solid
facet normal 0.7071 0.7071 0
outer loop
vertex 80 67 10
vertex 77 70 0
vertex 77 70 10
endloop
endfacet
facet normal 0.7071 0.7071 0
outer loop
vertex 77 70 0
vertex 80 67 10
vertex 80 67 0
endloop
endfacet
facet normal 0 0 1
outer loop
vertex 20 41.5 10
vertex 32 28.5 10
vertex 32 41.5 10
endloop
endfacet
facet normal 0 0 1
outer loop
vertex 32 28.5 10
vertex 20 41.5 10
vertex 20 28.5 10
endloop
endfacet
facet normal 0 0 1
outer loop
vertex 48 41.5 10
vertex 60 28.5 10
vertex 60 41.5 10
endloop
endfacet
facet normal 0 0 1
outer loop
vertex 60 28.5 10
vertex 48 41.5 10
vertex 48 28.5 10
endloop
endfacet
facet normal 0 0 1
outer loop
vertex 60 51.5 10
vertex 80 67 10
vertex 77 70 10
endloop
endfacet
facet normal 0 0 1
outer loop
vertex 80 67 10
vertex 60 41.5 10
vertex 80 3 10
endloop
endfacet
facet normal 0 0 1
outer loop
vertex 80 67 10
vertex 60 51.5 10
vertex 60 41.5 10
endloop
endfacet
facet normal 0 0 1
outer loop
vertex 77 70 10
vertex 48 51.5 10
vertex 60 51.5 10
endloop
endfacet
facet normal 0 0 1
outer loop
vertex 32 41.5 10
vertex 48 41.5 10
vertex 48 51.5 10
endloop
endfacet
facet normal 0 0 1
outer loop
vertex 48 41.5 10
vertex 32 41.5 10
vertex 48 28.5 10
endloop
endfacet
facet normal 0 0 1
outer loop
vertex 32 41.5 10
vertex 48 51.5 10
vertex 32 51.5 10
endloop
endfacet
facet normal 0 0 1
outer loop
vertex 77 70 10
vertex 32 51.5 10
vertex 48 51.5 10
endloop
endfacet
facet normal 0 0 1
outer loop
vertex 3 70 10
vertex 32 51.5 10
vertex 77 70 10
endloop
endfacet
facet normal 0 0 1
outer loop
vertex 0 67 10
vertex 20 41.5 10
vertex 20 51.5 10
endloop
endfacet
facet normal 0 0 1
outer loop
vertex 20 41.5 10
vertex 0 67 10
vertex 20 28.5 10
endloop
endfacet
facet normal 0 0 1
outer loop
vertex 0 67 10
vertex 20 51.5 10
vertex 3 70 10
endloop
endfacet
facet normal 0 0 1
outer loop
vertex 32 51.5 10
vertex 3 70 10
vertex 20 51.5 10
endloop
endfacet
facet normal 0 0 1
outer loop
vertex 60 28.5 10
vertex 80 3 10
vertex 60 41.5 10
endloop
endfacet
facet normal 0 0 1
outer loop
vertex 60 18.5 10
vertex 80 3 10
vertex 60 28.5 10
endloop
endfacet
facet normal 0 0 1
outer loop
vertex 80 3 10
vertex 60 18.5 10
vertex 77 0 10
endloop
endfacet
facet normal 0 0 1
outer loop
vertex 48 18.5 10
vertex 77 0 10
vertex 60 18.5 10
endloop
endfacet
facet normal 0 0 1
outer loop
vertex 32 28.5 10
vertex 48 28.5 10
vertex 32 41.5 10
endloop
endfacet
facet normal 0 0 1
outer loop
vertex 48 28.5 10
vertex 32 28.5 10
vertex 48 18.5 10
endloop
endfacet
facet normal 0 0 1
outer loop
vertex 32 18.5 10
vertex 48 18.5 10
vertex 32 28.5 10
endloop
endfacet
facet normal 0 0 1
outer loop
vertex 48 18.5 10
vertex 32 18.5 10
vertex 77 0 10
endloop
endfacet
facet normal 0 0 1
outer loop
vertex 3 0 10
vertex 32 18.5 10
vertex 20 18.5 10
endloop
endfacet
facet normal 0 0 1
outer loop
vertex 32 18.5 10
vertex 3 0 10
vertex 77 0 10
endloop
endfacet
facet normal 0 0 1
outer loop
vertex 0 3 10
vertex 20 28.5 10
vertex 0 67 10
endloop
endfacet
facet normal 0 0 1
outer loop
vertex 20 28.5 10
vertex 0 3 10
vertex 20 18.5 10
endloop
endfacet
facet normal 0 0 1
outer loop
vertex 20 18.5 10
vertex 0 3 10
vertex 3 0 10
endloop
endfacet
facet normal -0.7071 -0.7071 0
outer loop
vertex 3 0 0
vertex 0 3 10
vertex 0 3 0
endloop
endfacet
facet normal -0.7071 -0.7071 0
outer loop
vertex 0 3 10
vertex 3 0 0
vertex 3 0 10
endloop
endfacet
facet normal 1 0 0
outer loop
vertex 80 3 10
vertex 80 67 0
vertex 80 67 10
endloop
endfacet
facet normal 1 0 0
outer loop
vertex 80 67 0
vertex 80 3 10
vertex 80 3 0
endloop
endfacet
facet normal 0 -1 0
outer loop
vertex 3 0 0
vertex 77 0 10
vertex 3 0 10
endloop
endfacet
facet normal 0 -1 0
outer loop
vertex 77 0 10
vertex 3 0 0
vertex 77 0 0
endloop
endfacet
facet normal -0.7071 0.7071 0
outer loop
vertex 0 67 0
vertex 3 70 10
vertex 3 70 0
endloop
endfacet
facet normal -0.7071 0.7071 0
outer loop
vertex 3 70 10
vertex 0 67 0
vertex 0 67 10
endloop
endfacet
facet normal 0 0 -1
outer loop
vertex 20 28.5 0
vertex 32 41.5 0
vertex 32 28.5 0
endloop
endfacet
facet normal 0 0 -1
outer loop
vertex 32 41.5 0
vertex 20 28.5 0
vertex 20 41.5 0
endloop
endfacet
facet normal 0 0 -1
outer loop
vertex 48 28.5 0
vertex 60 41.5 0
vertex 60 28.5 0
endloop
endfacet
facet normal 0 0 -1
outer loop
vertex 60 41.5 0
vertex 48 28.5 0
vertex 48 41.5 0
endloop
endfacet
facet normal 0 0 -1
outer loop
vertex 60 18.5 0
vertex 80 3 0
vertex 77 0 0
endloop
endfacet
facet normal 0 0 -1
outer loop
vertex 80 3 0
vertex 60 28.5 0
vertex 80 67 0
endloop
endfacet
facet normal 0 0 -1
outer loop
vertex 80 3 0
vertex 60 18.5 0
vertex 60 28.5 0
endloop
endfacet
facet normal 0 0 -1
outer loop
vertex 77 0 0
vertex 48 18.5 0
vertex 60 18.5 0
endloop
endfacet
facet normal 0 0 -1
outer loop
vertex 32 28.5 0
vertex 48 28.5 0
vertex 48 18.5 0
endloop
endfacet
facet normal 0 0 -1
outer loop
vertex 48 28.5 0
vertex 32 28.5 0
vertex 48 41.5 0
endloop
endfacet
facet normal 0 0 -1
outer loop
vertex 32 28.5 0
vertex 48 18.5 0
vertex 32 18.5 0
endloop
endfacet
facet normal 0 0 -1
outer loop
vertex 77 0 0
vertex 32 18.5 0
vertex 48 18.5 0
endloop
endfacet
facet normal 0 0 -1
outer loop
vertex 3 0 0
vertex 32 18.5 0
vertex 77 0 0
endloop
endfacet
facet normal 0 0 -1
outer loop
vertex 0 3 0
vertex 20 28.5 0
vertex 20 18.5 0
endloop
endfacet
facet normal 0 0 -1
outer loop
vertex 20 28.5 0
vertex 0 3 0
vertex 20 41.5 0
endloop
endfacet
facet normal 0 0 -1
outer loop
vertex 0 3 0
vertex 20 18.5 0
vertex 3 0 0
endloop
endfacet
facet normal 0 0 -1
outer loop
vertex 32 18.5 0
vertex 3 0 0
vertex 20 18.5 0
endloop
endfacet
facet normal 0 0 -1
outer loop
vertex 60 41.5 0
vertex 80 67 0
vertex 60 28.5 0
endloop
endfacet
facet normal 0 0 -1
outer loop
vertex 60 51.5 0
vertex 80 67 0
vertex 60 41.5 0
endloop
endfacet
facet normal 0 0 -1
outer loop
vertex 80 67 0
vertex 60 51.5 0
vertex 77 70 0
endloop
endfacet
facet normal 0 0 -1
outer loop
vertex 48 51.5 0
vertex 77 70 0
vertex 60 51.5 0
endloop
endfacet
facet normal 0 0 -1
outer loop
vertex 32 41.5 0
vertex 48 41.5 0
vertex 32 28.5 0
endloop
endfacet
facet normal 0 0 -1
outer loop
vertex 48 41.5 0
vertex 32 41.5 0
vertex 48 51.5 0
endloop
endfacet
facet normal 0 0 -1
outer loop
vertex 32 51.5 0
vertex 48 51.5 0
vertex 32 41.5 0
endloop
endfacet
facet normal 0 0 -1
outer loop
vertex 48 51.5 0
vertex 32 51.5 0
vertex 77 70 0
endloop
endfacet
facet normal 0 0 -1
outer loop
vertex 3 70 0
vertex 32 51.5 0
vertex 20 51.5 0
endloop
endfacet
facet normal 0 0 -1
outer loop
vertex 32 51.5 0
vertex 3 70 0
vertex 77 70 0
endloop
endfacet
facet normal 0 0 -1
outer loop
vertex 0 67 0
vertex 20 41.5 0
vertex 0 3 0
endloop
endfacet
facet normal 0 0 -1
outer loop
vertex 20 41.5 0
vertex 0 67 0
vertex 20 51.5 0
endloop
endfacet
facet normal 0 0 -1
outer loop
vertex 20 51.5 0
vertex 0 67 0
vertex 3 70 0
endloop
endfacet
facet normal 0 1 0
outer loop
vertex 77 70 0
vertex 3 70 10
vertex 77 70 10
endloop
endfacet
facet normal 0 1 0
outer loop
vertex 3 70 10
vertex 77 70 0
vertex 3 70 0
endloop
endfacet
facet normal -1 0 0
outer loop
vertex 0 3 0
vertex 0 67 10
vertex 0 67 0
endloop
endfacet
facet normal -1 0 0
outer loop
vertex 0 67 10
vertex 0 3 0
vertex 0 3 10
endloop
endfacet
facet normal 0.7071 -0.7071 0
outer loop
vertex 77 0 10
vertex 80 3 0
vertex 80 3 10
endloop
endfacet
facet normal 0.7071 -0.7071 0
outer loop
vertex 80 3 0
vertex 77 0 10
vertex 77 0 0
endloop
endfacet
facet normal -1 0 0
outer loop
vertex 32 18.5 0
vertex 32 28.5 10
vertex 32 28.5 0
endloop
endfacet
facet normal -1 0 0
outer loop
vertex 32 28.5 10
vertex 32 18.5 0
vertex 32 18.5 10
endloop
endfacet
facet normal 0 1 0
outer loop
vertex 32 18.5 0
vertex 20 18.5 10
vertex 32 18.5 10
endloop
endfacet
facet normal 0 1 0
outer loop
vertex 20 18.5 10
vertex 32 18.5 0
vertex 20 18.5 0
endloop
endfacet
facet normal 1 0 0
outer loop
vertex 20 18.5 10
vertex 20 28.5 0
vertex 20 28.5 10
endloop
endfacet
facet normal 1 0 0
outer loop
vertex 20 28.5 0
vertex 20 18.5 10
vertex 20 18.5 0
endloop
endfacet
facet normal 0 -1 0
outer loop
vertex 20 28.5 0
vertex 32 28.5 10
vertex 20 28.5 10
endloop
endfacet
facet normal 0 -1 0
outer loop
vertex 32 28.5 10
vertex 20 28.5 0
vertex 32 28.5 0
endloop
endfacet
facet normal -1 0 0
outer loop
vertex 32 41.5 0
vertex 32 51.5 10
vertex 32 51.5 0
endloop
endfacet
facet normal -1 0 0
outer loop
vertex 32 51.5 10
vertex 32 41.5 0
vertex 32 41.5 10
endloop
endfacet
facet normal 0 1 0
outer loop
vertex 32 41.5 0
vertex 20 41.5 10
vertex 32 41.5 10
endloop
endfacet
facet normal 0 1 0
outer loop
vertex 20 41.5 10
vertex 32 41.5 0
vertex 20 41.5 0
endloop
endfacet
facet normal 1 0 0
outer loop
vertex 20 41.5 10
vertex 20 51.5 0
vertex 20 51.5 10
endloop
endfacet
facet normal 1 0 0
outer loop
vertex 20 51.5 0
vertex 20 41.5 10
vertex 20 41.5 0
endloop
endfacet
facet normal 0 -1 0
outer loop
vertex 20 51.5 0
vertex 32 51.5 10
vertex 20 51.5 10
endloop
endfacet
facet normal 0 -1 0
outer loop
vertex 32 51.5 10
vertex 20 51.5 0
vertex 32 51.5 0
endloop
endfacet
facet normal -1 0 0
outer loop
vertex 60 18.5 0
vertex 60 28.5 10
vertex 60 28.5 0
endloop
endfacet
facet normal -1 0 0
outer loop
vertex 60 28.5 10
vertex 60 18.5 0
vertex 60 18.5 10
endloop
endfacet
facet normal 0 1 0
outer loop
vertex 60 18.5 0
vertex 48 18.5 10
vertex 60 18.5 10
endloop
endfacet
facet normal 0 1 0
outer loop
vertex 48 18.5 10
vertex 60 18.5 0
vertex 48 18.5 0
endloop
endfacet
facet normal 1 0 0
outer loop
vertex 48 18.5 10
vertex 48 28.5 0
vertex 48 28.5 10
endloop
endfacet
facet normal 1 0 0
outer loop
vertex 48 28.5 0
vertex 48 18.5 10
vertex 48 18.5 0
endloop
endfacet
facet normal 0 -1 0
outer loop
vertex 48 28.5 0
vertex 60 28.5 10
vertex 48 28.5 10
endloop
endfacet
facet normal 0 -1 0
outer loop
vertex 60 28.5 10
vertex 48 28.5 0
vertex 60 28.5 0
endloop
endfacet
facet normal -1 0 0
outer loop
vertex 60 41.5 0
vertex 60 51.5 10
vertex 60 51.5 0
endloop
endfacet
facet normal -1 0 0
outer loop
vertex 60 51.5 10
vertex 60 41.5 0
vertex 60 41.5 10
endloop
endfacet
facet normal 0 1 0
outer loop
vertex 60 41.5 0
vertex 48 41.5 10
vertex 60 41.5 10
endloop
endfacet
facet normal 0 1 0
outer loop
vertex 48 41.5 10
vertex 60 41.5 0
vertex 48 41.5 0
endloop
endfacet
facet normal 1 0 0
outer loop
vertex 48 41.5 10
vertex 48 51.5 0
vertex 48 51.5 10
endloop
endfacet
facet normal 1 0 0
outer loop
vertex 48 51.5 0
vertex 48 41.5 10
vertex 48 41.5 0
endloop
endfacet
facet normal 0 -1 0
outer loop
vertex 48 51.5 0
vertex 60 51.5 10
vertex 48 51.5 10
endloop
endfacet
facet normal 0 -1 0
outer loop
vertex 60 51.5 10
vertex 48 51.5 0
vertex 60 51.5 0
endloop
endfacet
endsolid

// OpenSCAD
$fn = 32;

// ----------------------------------------------------------------------
// Windowed plate: 4 voids, 80 x 70 x 10 mm
// ----------------------------------------------------------------------

// --- parameters (mm) ---
plate_l = 80;             // plate length, X
plate_w = 70;             // plate width, Y
plate_t = 10;             // plate thickness, Z
edge_margin = 12;         // wall from the plate edge to any window
win_l = 12;               // pocket length
win_w = 10;               // pocket width
pitch_x = 28;             // grid pitch along X
pitch_y = 23;             // grid pitch along Y
depth_1 = 10;             // depth of void 1 (full thickness = through)
depth_2 = 10;             // depth of void 2 (full thickness = through)
depth_3 = 10;             // depth of void 3 (full thickness = through)
depth_4 = 10;             // depth of void 4 (full thickness = through)
corner_c = 3;             // corner chamfer of the plate

profile = [[3, 0], [77, 0], [80, 3], [80, 67], [77, 70], [3, 70], [0, 67], [0, 3]];  // primary outline, 8 points, counter clockwise
void_1 = [[20, 18.5], [32, 18.5], [32, 28.5], [20, 28.5]];  // pocket at grid node 0,0, 4 points
void_2 = [[20, 41.5], [32, 41.5], [32, 51.5], [20, 51.5]];  // pocket at grid node 0,1, 4 points
void_3 = [[48, 18.5], [60, 18.5], [60, 28.5], [48, 28.5]];  // pocket at grid node 1,0, 4 points
void_4 = [[48, 41.5], [60, 41.5], [60, 51.5], [48, 51.5]];  // pocket at grid node 1,1, 4 points

// --- the one profile operation ---
difference() {
  linear_extrude(height = plate_t) polygon(points = profile);
  translate([0, 0, -1])
    linear_extrude(height = plate_t + 2) polygon(points = void_1);
  translate([0, 0, -1])
    linear_extrude(height = plate_t + 2) polygon(points = void_2);
  translate([0, 0, -1])
    linear_extrude(height = plate_t + 2) polygon(points = void_3);
  translate([0, 0, -1])
    linear_extrude(height = plate_t + 2) polygon(points = void_4);
}
